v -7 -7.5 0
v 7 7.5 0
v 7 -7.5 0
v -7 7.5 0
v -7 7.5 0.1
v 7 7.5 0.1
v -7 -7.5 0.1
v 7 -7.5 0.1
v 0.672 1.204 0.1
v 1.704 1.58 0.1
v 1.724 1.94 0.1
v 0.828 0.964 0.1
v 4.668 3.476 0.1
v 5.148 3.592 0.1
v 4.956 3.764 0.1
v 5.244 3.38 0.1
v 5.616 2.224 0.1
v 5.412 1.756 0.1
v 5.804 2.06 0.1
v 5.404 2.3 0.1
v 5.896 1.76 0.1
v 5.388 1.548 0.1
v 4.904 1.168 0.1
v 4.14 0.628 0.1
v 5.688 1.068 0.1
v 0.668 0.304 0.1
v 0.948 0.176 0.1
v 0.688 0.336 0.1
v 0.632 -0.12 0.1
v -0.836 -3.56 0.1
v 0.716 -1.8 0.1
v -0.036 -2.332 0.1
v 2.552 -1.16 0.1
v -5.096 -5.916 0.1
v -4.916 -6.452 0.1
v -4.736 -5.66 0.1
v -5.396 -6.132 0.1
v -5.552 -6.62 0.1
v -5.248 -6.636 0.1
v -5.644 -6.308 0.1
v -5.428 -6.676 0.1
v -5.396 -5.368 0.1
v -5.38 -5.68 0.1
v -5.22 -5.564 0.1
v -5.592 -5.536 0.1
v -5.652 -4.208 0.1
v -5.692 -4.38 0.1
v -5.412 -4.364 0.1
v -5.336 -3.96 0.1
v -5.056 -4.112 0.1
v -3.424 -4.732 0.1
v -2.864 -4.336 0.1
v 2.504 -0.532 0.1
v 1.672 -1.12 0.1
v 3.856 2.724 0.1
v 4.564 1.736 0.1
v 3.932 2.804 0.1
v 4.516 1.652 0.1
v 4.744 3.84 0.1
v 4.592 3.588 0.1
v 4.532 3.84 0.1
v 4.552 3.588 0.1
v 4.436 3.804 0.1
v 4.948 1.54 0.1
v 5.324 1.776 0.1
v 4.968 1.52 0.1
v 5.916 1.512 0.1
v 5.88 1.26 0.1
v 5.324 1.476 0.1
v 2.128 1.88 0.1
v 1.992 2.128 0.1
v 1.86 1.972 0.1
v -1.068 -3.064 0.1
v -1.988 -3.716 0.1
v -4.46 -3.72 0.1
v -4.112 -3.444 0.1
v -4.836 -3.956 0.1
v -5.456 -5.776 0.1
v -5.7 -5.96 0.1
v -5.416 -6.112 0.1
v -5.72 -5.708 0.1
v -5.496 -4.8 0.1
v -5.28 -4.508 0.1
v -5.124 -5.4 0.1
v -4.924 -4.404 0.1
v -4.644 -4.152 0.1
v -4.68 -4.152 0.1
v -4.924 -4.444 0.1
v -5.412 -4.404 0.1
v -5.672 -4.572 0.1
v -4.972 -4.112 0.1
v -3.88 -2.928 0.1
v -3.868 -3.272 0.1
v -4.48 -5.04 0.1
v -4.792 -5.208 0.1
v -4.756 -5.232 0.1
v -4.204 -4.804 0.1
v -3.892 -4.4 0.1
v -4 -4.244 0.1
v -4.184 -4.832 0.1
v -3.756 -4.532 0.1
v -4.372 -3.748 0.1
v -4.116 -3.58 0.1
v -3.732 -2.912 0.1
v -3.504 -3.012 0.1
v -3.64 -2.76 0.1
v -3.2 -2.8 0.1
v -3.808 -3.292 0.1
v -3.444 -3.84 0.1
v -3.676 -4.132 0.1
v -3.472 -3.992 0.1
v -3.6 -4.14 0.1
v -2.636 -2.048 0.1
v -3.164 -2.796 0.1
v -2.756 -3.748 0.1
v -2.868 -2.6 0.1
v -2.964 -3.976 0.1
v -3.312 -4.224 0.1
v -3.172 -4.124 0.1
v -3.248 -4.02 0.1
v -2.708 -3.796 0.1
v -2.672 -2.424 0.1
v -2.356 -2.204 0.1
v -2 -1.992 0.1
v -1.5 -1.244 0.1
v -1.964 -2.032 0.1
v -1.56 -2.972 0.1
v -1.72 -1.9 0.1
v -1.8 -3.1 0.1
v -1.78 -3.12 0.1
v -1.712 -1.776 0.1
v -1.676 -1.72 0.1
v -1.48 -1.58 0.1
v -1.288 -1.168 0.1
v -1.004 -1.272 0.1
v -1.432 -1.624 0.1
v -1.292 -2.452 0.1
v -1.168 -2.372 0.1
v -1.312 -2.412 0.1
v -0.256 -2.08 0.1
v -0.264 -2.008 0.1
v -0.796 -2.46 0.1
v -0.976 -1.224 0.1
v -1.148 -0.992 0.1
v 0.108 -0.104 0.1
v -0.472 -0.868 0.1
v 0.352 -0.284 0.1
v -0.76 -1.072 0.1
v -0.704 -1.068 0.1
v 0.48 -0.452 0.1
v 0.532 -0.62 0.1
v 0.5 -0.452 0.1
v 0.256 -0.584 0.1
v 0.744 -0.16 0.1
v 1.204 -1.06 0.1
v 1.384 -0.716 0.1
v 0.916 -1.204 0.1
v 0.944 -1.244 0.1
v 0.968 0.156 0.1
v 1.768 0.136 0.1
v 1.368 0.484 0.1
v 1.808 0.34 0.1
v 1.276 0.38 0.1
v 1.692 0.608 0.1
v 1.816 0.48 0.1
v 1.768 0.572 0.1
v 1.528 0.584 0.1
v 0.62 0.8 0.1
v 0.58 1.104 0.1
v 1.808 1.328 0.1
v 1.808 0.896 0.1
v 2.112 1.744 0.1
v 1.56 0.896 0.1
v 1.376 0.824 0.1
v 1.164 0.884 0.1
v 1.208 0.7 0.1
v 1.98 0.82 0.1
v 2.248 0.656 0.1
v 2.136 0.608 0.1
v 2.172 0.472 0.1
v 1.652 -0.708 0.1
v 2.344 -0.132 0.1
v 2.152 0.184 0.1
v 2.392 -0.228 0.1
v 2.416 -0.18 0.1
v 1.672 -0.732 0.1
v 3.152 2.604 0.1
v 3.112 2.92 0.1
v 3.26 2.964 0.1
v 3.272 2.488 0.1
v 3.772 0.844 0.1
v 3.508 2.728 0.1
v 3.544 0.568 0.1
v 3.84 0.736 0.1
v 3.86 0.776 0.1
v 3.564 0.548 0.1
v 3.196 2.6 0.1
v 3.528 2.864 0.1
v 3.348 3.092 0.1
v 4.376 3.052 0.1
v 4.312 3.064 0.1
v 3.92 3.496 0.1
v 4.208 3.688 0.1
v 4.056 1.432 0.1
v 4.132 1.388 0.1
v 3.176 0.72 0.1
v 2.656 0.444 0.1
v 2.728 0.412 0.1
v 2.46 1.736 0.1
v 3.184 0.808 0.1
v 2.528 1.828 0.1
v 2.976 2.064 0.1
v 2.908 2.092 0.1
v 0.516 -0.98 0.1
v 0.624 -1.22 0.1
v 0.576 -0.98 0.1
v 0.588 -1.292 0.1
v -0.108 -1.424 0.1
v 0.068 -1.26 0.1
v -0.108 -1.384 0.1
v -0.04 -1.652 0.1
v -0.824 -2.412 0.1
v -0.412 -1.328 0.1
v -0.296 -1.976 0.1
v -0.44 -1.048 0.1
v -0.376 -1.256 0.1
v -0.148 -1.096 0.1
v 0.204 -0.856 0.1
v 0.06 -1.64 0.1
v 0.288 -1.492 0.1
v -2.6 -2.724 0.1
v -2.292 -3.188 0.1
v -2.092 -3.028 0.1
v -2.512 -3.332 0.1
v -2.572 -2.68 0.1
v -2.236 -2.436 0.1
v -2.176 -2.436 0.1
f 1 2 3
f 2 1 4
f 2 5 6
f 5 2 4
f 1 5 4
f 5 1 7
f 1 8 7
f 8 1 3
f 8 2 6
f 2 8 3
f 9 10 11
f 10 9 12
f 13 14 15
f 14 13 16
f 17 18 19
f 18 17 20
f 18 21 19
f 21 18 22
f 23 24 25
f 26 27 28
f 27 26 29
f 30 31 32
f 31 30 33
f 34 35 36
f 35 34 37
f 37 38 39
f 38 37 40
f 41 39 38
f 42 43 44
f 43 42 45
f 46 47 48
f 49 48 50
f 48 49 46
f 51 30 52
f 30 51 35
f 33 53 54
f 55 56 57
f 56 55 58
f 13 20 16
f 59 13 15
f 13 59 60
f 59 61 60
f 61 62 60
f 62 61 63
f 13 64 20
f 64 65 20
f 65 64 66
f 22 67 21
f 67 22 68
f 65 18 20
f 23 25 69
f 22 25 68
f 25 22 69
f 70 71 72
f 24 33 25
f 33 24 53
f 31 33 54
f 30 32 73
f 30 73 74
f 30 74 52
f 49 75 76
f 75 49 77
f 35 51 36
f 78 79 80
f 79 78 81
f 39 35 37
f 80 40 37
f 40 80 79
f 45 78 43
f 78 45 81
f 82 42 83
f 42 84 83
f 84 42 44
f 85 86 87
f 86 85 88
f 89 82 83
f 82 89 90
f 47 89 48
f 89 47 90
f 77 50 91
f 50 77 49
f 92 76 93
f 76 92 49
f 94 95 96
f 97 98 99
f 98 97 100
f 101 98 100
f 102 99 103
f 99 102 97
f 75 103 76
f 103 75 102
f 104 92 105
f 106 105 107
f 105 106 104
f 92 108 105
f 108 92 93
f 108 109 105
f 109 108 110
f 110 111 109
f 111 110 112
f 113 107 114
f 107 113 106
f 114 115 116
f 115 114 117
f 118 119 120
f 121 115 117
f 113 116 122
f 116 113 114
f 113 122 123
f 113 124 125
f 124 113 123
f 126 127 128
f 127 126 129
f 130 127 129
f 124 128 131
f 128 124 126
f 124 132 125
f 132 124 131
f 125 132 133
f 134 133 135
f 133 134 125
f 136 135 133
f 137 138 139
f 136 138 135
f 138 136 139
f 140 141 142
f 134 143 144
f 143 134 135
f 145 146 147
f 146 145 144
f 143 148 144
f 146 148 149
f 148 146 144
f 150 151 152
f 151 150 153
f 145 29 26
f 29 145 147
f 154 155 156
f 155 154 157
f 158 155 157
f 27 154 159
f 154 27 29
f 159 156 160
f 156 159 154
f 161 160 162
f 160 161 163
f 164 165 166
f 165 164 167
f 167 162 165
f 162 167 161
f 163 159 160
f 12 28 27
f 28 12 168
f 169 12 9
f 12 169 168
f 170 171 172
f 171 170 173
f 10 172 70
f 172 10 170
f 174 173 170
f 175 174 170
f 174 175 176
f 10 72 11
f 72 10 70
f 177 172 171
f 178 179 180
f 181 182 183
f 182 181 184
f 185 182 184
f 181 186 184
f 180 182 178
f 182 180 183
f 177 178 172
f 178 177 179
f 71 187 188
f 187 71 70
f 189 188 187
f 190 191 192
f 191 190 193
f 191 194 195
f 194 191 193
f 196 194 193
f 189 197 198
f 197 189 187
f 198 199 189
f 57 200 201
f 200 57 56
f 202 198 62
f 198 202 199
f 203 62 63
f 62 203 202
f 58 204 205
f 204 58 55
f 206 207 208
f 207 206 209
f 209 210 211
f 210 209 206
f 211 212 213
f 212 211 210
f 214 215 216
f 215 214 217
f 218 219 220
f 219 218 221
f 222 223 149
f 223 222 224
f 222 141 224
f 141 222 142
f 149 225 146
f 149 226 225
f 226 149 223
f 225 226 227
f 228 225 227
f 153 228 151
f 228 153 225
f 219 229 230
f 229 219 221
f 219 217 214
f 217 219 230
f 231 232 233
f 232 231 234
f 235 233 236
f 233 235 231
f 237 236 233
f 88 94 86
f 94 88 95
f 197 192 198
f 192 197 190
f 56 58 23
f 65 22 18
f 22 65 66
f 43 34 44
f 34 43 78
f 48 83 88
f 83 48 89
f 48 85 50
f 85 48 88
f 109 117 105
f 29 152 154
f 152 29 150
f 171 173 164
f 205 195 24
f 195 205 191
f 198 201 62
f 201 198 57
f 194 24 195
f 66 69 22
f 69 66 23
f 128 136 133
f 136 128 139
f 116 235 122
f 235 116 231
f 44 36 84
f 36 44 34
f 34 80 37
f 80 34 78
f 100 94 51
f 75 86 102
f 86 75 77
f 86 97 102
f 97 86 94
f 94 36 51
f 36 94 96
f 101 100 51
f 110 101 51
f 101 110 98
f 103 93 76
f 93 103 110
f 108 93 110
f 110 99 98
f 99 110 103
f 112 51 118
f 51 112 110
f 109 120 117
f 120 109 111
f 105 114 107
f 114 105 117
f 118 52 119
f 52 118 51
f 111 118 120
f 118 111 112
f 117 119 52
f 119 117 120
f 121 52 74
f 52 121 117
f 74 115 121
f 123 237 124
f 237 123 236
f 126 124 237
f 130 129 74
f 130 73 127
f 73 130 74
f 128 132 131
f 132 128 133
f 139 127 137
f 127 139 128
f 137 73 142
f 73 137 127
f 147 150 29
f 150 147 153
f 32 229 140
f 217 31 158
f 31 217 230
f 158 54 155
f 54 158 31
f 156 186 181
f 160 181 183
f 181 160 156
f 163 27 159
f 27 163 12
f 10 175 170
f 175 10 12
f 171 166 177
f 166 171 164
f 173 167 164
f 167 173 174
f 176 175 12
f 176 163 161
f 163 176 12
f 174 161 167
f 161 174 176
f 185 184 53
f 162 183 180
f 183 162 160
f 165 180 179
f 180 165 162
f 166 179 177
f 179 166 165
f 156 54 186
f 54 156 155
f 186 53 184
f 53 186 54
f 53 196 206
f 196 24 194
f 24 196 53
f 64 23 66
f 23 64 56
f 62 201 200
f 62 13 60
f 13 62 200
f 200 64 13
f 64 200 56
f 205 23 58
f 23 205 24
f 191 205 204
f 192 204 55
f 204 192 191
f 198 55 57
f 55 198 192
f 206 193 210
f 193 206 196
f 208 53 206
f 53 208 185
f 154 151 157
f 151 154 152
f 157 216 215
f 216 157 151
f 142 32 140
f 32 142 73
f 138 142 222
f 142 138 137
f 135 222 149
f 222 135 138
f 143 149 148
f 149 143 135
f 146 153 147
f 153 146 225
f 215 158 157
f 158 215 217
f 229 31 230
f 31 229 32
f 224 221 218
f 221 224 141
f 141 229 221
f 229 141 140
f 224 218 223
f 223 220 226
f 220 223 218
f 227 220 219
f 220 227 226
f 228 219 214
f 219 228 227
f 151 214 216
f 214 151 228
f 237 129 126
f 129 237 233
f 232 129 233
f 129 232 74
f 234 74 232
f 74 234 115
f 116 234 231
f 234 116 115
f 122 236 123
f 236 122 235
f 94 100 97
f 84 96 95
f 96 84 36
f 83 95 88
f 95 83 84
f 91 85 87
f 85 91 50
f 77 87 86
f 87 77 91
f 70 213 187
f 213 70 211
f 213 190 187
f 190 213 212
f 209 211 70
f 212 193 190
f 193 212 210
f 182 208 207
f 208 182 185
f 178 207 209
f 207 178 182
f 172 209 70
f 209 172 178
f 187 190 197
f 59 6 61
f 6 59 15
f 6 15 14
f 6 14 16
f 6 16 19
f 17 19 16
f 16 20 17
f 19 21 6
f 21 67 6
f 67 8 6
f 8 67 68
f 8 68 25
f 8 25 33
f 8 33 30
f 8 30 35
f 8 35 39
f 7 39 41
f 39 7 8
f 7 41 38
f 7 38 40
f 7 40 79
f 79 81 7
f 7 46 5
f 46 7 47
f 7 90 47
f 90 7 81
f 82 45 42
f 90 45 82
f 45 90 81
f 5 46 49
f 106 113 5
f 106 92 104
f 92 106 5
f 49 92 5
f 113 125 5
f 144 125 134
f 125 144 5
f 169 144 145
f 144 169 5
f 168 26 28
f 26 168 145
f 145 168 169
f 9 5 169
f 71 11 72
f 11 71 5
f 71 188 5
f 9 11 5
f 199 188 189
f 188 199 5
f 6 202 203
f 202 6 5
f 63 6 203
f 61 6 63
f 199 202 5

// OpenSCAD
// file: ../p/box5-12.scad
use <../lib.scad>
function ldraw_lib__box5_12() = [
// 0 Box with 5 Faces without Any Edges
// 0 Name: box5-12.dat
// 0 Author: Chris Dee [cwdee]
// 0 !LDRAW_ORG Primitive UPDATE 2009-02
// 0 !LICENSE Licensed under CC BY 4.0 : see CAreadme.txt
// 
// 0 BFC CERTIFY CCW
  [0,"BFC","CERTIFY"],
  [0,"BFC","CCW"],
// 
// 0 !HISTORY 2009-09-03 [PTadmin] Official Update 2009-02
// 
// 
// 4 16 1 1 1 1 1 -1 -1 1 -1 -1 1 1
  [4,16,1,1,1,1,1,-1,-1,1,-1,-1,1,1],
// 4 16 -1 0 1 1 0 1 1 1 1 -1 1 1
  [4,16,-1,0,1,1,0,1,1,1,1,-1,1,1],
// 4 16 -1 0 -1 -1 0 1 -1 1 1 -1 1 -1
  [4,16,-1,0,-1,-1,0,1,-1,1,1,-1,1,-1],
// 4 16 1 0 -1 -1 0 -1 -1 1 -1 1 1 -1
  [4,16,1,0,-1,-1,0,-1,-1,1,-1,1,1,-1],
// 4 16 1 0 1 1 0 -1 1 1 -1 1 1 1
  [4,16,1,0,1,1,0,-1,1,1,-1,1,1,1],
// 0
];
module ldraw_lib__box5_12(step=0, col=false, unit=2/5, alt=false, line=0.2, solid=!$preview)
    makepoly(ldraw_lib__box5_12(), step=step, col=col, unit=unit, alt=alt, line=line, solid=solid);
ldraw_lib__box5_12(line=0.2);
// main file
use <../lib.scad>
use <../p/box5-12.scad>
use <s/6296256es01.scad>
function ldraw_lib__6372023e() = [
// 0 Sticker  1.9 x  1.8 with "nuova 500" Emblem on Bright Light Blue
// 0 Name: 6372023e.dat
// 0 Author: Magnus Forsberg [MagFors]
// 0 !LDRAW_ORG Part UPDATE 2024-05
// 0 !LICENSE Licensed under CC BY 4.0 : see CAreadme.txt
// 
// 0 BFC CERTIFY CCW
  [0,"BFC","CERTIFY"],
  [0,"BFC","CCW"],
// 
// 0 !KEYWORDS 500, Bricklink 77942stk01, Brickowl 1064764, Cinquecento, FIAT
// 0 !KEYWORDS Nuova, Rebrickable 83460, set 77942
// 
// 0 !HISTORY 2024-06-30 [OrionP] Official Update 2024-05
// 
// 
// 1 16 0 -.25 0 17.5 0 0 0 .25 0 0 0 18.75 box5-12.dat
  [1,16,0,-.25,0,17.5,0,0,0,.25,0,0,0,18.75, ldraw_lib__box5_12()],
// 1 212 0 0 0 1 0 0 0 1 0 0 0 1 s\6296256es01.dat
  [1,212,0,0,0,1,0,0,0,1,0,0,0,1, ldraw_lib__s__6296256es01()],
];
module ldraw_lib__6372023e(step=0, col=false, unit=2/5, alt=false, line=0.2, solid=!$preview)
    makepoly(ldraw_lib__6372023e(), step=step, col=col, unit=unit, alt=alt, line=line, solid=solid);
ldraw_lib__6372023e(line=0.2);
